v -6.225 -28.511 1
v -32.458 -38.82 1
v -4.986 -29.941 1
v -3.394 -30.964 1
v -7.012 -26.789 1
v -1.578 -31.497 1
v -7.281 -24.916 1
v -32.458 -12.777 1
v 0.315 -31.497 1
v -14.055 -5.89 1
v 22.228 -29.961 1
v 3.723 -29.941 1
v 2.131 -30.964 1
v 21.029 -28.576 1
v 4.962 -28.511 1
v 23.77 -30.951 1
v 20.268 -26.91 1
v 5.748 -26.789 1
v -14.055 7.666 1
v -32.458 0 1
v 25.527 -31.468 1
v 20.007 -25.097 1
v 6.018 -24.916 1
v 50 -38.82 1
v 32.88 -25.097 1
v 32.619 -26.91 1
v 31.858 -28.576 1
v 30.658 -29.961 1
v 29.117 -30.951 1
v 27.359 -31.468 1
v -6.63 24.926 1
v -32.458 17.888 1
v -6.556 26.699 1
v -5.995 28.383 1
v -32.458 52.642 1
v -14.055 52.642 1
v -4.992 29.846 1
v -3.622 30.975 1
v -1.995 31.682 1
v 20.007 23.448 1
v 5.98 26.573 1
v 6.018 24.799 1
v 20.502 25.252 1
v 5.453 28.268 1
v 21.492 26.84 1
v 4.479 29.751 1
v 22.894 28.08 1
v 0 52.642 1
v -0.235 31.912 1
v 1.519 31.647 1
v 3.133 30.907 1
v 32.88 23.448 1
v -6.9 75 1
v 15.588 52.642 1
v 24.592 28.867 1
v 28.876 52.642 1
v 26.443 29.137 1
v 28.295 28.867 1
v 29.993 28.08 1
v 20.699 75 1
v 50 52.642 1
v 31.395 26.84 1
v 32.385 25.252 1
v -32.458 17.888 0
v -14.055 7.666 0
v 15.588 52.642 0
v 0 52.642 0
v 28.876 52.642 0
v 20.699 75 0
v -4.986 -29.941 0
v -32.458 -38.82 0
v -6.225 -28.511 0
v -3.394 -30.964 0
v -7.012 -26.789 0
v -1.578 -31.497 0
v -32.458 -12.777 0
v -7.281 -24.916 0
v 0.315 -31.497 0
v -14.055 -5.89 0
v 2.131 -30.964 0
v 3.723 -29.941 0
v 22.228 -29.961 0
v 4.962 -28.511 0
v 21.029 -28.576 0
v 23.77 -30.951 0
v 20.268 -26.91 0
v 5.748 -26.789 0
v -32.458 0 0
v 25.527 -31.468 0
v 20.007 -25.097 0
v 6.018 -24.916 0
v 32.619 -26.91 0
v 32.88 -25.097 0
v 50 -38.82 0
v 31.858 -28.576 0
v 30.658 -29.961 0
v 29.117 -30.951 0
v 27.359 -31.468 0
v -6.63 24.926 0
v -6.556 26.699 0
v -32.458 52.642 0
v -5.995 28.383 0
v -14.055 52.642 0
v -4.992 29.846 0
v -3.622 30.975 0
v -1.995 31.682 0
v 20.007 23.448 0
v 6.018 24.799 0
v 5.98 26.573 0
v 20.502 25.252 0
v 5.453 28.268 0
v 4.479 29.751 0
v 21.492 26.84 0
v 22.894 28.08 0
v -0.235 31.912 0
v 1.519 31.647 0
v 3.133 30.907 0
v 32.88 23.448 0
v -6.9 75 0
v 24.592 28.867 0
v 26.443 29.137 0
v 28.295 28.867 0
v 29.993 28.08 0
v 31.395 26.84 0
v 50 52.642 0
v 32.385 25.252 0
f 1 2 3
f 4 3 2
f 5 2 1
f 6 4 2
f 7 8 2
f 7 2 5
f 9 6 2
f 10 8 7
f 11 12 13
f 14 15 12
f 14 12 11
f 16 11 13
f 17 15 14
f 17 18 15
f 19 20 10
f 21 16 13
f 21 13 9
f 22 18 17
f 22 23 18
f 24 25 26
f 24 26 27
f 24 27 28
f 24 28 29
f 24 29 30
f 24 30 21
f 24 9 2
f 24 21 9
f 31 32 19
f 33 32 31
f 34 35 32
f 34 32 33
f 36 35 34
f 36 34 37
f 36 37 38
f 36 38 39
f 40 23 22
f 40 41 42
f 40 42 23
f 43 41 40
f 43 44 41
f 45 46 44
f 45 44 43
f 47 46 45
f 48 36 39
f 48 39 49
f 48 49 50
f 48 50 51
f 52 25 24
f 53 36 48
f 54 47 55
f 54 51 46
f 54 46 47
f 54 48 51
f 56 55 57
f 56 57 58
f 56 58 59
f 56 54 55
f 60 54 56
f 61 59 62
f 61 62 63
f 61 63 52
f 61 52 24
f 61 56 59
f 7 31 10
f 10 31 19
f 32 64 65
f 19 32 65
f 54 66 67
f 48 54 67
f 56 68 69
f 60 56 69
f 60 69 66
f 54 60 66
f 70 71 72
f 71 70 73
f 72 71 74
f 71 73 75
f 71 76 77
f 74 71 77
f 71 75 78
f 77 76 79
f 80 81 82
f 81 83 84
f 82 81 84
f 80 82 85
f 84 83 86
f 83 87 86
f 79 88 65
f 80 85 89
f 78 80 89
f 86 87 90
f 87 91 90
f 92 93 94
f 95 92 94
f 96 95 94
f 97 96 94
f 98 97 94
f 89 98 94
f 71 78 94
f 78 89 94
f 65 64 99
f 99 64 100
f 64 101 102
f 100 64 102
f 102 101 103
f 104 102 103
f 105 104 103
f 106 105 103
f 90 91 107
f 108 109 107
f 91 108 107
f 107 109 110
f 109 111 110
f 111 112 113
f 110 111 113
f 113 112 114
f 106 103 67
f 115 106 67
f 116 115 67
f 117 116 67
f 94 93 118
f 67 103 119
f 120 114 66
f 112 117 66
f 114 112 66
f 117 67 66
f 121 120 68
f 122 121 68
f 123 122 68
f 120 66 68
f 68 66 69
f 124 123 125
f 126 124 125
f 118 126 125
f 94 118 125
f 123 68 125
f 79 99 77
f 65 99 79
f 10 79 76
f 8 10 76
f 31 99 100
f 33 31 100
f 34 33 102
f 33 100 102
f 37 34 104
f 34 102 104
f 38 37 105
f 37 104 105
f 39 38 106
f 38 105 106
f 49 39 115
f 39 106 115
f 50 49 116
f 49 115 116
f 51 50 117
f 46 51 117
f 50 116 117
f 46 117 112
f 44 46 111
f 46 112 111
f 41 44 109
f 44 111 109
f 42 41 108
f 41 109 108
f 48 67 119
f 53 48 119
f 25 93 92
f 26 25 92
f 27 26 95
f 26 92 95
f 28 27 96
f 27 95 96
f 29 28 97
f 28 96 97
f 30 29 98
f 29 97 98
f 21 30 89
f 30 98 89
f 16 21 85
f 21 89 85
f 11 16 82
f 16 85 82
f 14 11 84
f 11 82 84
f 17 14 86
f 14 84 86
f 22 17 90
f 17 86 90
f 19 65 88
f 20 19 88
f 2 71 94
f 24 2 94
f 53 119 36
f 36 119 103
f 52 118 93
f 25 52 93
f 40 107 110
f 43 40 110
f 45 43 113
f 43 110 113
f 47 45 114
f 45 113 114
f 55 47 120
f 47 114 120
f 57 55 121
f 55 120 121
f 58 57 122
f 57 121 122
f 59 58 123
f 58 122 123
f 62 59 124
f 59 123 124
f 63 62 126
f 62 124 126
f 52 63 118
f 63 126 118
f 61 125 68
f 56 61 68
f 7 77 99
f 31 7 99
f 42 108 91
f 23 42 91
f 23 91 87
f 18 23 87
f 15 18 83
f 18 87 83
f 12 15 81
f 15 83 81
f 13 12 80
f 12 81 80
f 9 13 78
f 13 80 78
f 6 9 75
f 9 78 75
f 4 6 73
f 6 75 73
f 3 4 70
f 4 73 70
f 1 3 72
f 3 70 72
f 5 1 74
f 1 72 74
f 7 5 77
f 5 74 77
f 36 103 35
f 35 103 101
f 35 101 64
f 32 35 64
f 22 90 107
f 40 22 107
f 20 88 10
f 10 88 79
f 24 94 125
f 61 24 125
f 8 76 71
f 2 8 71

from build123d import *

# Parameters (mm, degrees)
F1_DEPTH = 1


# Not quite as in the source:
# - ends of sketch curves that miss each other by under 0.0002 mm in the source are joined


with BuildPart() as f1:
    # F0 (on Top) → F1 (new body)
    with BuildSketch(Plane.XY):
        Polygon((28.8763996214, 52.6419393718), (20.6990148872, 75), (15.5881475657, 52.6419393718), (0, 52.6419393718), (-6.8996730261, 75), (-14.0548860654, 52.6419393718), (-32.458178699, 52.6419393718), (-32.458178699, 17.8880356252), (-14.0548860654, 7.6663014479), (-32.458178699, 0), (-14.0548860654, -5.889575201), (-32.458178699, -12.7771692351), (-32.458178699, -38.8200990856), (50, -38.8200990856), (50, 52.6419393718), align=None)
        with BuildLine():
            ThreePointArc((-6.6301580518, 24.9263830483), (-0.2351544327, 31.911792251), (6.0177850537, 24.7989334166))
            Line((6.0177850537, 24.7989334166), (6.0177850537, -24.9158367515))
            ThreePointArc((6.0177850537, -24.9158367515), (-0.631557079, -31.5651788842), (-7.2808992118, -24.9158367515))
            Line((-7.2808992118, -24.9158367515), (-6.6301580518, 24.9263830483))
        make_face(mode=Mode.SUBTRACT)
        with BuildLine():
            ThreePointArc((20.0069602579, 23.4479047358), (26.4433873817, 29.1369264448), (32.8798145056, 23.4479047358))
            Line((32.8798145056, 23.4479047358), (32.8798145056, -25.096591562))
            ThreePointArc((32.8798145056, -25.096591562), (26.443391107, -31.5330224112), (20.0069602579, -25.096591562))
            Line((20.0069602579, -25.096591562), (20.0069602579, 23.4479047358))
        make_face(mode=Mode.SUBTRACT)
    extrude(amount=F1_DEPTH)


solid = f1.part
